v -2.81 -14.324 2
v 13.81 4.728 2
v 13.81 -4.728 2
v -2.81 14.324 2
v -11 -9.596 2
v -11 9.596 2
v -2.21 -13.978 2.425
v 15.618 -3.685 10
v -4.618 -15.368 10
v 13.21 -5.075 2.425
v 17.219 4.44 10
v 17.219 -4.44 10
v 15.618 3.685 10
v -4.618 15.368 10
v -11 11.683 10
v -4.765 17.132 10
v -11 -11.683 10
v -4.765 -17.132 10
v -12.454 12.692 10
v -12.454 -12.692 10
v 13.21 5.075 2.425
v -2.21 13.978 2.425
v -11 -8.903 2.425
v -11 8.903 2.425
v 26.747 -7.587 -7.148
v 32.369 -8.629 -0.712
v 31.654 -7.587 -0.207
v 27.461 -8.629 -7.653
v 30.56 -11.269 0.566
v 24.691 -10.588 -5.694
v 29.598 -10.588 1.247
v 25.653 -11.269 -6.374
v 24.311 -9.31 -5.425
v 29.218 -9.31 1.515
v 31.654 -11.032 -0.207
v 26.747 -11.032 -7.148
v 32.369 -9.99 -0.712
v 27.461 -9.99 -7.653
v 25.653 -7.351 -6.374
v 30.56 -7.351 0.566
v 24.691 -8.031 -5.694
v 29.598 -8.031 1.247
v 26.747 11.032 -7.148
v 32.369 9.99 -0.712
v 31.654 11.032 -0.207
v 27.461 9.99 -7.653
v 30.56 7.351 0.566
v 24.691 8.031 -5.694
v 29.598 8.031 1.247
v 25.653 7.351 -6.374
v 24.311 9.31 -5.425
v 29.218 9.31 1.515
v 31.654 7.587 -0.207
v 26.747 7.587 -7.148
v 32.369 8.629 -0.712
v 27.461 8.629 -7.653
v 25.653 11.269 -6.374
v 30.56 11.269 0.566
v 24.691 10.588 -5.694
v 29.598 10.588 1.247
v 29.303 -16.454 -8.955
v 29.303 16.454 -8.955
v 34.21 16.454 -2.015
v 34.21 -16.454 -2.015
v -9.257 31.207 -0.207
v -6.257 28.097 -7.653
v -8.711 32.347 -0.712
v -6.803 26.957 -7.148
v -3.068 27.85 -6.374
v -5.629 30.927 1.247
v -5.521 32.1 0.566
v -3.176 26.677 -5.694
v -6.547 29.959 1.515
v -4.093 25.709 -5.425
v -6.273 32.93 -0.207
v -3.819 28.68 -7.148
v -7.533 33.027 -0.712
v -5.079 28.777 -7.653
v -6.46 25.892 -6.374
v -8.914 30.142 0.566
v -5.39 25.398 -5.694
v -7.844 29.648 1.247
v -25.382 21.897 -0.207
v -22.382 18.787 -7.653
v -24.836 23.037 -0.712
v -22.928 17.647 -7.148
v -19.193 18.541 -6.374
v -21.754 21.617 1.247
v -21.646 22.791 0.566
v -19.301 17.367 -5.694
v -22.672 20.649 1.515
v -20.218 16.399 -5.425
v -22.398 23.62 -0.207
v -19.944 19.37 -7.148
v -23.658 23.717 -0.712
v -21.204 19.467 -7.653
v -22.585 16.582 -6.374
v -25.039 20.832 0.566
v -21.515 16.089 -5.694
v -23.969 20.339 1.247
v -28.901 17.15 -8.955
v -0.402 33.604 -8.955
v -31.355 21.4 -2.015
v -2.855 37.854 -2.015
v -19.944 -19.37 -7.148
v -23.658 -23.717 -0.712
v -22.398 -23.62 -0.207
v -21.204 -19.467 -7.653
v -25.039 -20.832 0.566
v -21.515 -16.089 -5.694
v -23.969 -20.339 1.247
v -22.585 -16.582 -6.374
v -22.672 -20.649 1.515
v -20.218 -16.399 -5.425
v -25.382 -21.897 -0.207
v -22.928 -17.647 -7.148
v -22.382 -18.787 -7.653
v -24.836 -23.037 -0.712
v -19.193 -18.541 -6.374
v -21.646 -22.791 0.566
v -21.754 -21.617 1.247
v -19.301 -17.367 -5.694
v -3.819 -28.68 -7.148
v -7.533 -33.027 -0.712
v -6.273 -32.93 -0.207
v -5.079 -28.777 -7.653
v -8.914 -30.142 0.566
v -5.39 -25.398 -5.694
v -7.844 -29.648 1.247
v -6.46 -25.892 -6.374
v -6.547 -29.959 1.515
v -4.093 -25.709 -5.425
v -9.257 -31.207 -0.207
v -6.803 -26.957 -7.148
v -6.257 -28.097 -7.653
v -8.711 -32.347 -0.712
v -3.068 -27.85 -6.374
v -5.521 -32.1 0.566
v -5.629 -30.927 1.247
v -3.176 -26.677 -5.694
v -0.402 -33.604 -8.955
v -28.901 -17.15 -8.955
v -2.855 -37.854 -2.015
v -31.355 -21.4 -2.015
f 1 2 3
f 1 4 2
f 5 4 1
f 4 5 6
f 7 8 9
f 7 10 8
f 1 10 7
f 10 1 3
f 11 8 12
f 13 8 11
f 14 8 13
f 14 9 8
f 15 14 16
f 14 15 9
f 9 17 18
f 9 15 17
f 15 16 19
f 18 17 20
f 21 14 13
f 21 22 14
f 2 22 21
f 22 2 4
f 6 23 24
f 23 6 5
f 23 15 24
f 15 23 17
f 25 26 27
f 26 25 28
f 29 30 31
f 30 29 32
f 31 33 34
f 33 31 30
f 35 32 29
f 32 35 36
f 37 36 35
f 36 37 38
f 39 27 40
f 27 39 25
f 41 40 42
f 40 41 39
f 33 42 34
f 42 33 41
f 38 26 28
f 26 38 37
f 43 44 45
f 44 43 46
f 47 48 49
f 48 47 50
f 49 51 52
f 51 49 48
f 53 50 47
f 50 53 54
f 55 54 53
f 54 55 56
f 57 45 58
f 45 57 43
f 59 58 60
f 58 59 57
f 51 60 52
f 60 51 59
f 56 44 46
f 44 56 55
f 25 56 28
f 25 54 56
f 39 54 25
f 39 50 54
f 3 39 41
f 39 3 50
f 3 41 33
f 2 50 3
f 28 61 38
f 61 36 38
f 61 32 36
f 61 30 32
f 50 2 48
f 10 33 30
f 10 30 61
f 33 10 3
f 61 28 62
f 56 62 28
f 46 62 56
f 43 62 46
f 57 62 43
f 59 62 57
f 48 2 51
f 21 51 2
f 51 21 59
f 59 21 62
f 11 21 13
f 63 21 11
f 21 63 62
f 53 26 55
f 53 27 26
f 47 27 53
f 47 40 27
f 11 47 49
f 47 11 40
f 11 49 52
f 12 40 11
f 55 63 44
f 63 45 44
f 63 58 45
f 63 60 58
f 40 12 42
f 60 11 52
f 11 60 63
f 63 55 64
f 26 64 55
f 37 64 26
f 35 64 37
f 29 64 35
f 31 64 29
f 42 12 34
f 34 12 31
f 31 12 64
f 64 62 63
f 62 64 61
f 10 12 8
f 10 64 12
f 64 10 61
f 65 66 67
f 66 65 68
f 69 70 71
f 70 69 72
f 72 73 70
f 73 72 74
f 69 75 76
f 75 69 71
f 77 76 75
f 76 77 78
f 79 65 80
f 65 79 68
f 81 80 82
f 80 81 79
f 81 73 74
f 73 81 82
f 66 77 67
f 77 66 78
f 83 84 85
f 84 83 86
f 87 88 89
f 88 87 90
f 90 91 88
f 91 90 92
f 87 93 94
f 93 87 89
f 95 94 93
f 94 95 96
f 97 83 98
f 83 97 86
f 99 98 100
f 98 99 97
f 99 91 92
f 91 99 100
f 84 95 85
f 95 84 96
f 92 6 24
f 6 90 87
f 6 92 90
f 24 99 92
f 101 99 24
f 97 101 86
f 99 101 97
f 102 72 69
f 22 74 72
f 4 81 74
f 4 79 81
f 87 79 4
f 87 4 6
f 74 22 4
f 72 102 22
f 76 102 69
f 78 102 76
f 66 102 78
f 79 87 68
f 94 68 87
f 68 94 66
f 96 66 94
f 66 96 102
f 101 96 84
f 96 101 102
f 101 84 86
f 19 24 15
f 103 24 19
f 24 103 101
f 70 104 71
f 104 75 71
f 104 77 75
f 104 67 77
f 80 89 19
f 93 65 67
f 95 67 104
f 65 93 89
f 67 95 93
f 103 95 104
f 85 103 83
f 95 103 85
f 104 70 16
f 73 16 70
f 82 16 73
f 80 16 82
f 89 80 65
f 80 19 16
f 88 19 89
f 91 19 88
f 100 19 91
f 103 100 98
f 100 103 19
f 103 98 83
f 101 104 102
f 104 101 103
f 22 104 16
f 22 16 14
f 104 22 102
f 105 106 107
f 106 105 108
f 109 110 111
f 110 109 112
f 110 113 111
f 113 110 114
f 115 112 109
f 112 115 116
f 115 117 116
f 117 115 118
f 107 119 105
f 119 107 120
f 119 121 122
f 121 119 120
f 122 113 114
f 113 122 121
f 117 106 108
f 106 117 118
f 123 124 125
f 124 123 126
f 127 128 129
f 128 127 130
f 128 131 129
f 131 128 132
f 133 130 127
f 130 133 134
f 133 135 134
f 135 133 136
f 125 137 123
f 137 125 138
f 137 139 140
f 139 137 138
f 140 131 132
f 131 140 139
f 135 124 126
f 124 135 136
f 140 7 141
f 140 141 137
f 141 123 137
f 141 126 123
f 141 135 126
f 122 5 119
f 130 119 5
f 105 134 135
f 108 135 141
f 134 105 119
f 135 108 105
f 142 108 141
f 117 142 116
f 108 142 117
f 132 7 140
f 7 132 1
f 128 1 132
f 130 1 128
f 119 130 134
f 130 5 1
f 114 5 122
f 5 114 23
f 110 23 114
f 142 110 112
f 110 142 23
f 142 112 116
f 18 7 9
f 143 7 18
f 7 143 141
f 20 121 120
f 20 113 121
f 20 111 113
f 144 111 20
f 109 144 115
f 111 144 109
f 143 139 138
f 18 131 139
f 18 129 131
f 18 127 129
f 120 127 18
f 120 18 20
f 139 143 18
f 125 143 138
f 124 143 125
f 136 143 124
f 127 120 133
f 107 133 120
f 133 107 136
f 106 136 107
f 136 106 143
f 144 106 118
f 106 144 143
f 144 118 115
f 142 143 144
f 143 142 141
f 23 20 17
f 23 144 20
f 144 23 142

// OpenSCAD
// file: nuts-and-bolts.scad
// copied from https://github.com/openscad/MCAD/blob/master/nuts_and_bolts.scad
// Copyright 2010 D1plo1d

// This library is dual licensed under the GPL 3.0 and the GNU Lesser General Public License as per http://creativecommons.org/licenses/LGPL/2.1/ .

include <constants.scad>

module SKIPtestNutsAndBolts()
{
	$fn = 360;
	translate([0,15])nutHole(3, proj=2);
	boltHole(3, length= 30, proj=2);
}

MM = "mm";

//Based on: http://www.roymech.co.uk/Useful_Tables/Screws/Hex_Screws.htm
METRIC_NUT_AC_WIDTHS =
[
	-1, //0 index is not used but reduces computation
	-1,
	-1,
	6.40,//m3
	8.10,//m4
	9.20,//m5
	11.50,//m6
	-1,
	15.00,//m8
	-1,
	19.60,//m10
	-1,
	22.10,//m12
	-1,
	-1,
	-1,
	27.70,//m16
	-1,
	-1,
	-1,
	34.60,//m20
	-1,
	-1,
	-1,
	41.60,//m24
	-1,
	-1,
	-1,
	-1,
	-1,
	53.1,//m30
	-1,
	-1,
	-1,
	-1,
	-1,
	63.5//m36
];
METRIC_NUT_THICKNESS =
[
	-1, //0 index is not used but reduces computation
	-1,
	-1,
	2.40,//m3
	3.20,//m4
	4.00,//m5
	5.00,//m6
	-1,
	6.50,//m8
	-1,
	8.00,//m10
	-1,
	10.00,//m12
	-1,
	-1,
	-1,
	13.00,//m16
	-1,
	-1,
	-1,
	16.00//m20
	-1,
	-1,
	-1,
	19.00,//m24
	-1,
	-1,
	-1,
	-1,
	-1,
	24.00,//m30
	-1,
	-1,
	-1,
	-1,
	-1,
	29.00//m36
];

COURSE_METRIC_BOLT_MAJOR_THREAD_DIAMETERS =
[//based on max values
	-1, //0 index is not used but reduces computation
	-1,
	-1,
	2.98,//m3
	3.978,//m4
	4.976,//m5
	5.974,//m6
	-1,
	7.972,//m8
	-1,
	9.968,//m10
	-1,
	11.966,//m12
	-1,
	-1,
	-1,
	15.962,//m16
	-1,
	-1,
	-1,
	19.958,//m20
	-1,
	-1,
	-1,
	23.952,//m24
	-1,
	-1,
	-1,
	-1,
	-1,
	29.947,//m30
	-1,
	-1,
	-1,
	-1,
	-1,
	35.940//m36
];

module nut_hole(size, units=MM, tolerance = +0.0001, proj = -1)
{
	//takes a metric screw/nut size and looksup nut dimensions
	radius = METRIC_NUT_AC_WIDTHS[size]/2+tolerance;
	height = METRIC_NUT_THICKNESS[size]+tolerance;
	if (proj == -1)
	{
		cylinder(r= radius, h=height, $fn = 6, center=[0,0]);
	}
	if (proj == 1)
	{
		circle(r= radius, $fn = 6);
	}
	if (proj == 2)
	{
		translate([-radius/2, 0])
			square([radius*2, height]);
	}
}

module bolt_hole(size, units=MM, length, tolerance = +0.0001, proj = -1)
{
	radius = COURSE_METRIC_BOLT_MAJOR_THREAD_DIAMETERS[size]/2+tolerance;
//TODO: proper screw cap values
	capHeight = METRIC_NUT_THICKNESS[size]+tolerance; //METRIC_BOLT_CAP_HEIGHTS[size]+tolerance;
	capRadius = METRIC_NUT_AC_WIDTHS[size]/2+tolerance; //METRIC_BOLT_CAP_RADIUS[size]+tolerance;

	if (proj == -1)
	{
    translate([0, 0, -capHeight])
    cylinder(
      r= capRadius,
      h=capHeight,
      $fa = MIN_ARC_FRAGMENT_ANGLE,
      $fs = MIN_ARC_FRAGMENT_SIZE
    );
    
    cylinder(
      r = radius,
      h = length,
      $fa = MIN_ARC_FRAGMENT_ANGLE,
      $fs = MIN_ARC_FRAGMENT_SIZE
    );
	}
  
	if (proj == 1)
	{
		circle(r = radius);
	}
  
	if (proj == 2)
	{
		translate([-capRadius/2, -capHeight])
    square([capRadius*2, capHeight]);
    
		square([radius*2, length]);
	}
}
// file: constants.scad
MM = 1;
CM = 10 * MM;
DM = 100 * MM;
M = 1000 * MM;

X = [1, 0, 0];
Y = [0, 1, 0];
Z = [0, 0, 1];

ROT=360;
INFINITESIMAL = 0.01;
INFINITY = 1000;

FILAMENT_WIDTH = 3;
MIN_ARC_FRAGMENT_ANGLE = 6;
MIN_ARC_FRAGMENT_SIZE = FILAMENT_WIDTH / 2;
// main file
echo(version=version());

include <constants.scad>
include <nuts-and-bolts.scad>

ARMS_PER_EDGE = 3;
EDGES_PER_VERTEX = 3;
EDGE_CONNECTOR_LENGTH = 19;
EDGE_CONNECTOR_OFFSET = 24;
EDGE_CONNECTOR_HEIGHT = 8.5;

VERTEX_SURFACE_LENGTH = 22;
VERTEX_SURFACE_HEIGHT = 8;

VERTEX_Z_OFFSET = 2;

VERTEX_BEAM_X_LENGTH = 26;
VERTEX_BEAM_Y_LENGTH = 8;
VERTEX_BEAM_Z_LENGTH = 0;

VERTEX_MAX_Z = VERTEX_Z_OFFSET + VERTEX_SURFACE_HEIGHT + VERTEX_BEAM_Z_LENGTH;

SCREW_SIZE = 4;
SCREW_LENGTH = INFINITY;
SCREW_OFFSET = 10.75;

/*
HEADER_NUM_PINS = 4;
HEADER_PITCH = 2.54;
HEADER_X_LENGTH = HEADER_PITCH * (HEADER_NUM_PINS * + 0.4) + 0.25;
HEADER_Y_LENGTH = 2.4;
HEADER_Z_LENGTH = 8.5;
HEADER_Y_OFFSET = 2;
*/

// sin(phi) = x
// sin^-1(x) = phi

// h^2 + (1/2)^2 = 1^2
// h = sqrt(3) / 2

// h = x + w

// tan(30) = w / (1/2)
// w = (1/2)tan(30)

// phi = sin^-1((sqrt(3)/2) - (1/2)tan(30))

edge_theta = 35.26439;

// 30 from vertical
// 120 around vertical axis
// 120 again

// nominate an axis as the pole
// rotate your point towards the normal = latitude
// rotate around the pole = longitude


     
main();

module main () {
  intersection () {
    below(z = VERTEX_MAX_Z);
    
    union () {
      vertex_connector();
      edge_connectors();
    };
  }
}

module vertex_connector () {
  difference () {
    union () {
      rotate((1 / EDGES_PER_VERTEX) * ROT)
      translate([0, 0, VERTEX_Z_OFFSET])
      linear_extrude(
        height = VERTEX_SURFACE_HEIGHT
      )
      polygon(ngon(EDGES_PER_VERTEX, VERTEX_SURFACE_LENGTH));
    
      for (edge_index = [0 : EDGES_PER_VERTEX]) {
        edge_phi = edge_index * (ROT / EDGES_PER_VERTEX);
        
        rotate(a = [0, 0, edge_phi])
        translate([
          0,
          -(1/2) * VERTEX_BEAM_Y_LENGTH,
          VERTEX_Z_OFFSET  + VERTEX_SURFACE_HEIGHT
        ])
        cube([
          VERTEX_BEAM_X_LENGTH,
          VERTEX_BEAM_Y_LENGTH,
          VERTEX_BEAM_Z_LENGTH
        ]);
      }
    }
    
    // subtract the space that would interfere with the edge connectors
    union () {
      for (edge_index = [0 : EDGES_PER_VERTEX]) {
        edge_phi = edge_index * (ROT / EDGES_PER_VERTEX);
        
        translate(
          [
            EDGE_CONNECTOR_OFFSET*cos(edge_phi),
            EDGE_CONNECTOR_OFFSET*sin(edge_phi),
            0
          ]
        )
        rotate(a = [0, edge_theta, edge_phi])
        rotate([0, 0, (1 / 2 * EDGES_PER_VERTEX) * ROT])
        translate([0, (-1/2) * INFINITY, (1/2) * EDGE_CONNECTOR_HEIGHT - INFINITESIMAL])
        cube(INFINITY);
      }
    }
  }
}

module edge_connectors () {
  for (edge_index = [0 : EDGES_PER_VERTEX]) {
    edge_phi = edge_index * (ROT / EDGES_PER_VERTEX);

    translate(
      [
        EDGE_CONNECTOR_OFFSET*cos(edge_phi),
        EDGE_CONNECTOR_OFFSET*sin(edge_phi),
        0
      ]
    )
    rotate(a = [0, edge_theta, edge_phi])
    // union () {
    //  cylinder(r = 21.5, h = 20);
    edge_connector();
    // }
  }
}

module edge_connector () {
  rotate(a = [0, 0, (1 / 2 * ARMS_PER_EDGE) * ROT])
  difference () {
    // triangle
    translate([0, 0, (-1/2) * EDGE_CONNECTOR_HEIGHT])
    linear_extrude(
      height = EDGE_CONNECTOR_HEIGHT
    )
    polygon(ngon(ARMS_PER_EDGE, EDGE_CONNECTOR_LENGTH));

        
    // minus bolts
    for (screw_index = [1 : ARMS_PER_EDGE - 1]) {
      screw_phi = screw_index * (ROT / ARMS_PER_EDGE);

      translate([
        SCREW_OFFSET*cos(screw_phi),
        SCREW_OFFSET*sin(screw_phi),
        - (1/2) * SCREW_LENGTH
      ])
      bolt_hole(
        size = SCREW_SIZE,
        length = SCREW_LENGTH
      );
    }
  }
}

// Simple list comprehension for creating N-gon vertices
function ngon(num, r) = [for (i=[0:num-1], a=i*360/num) [ r*cos(a), r*sin(a) ]];

module below (z) {
  translate(
    [
      -INFINITY / 2,
      -INFINITY / 2,
      z - (INFINITY)
    ]
  )
  cube(INFINITY);
}

module above (z) {
  translate(
    [
      -INFINITY / 2,
      -INFINITY / 2,,
      z
    ]
  )
  cube(INFINITY);
}
